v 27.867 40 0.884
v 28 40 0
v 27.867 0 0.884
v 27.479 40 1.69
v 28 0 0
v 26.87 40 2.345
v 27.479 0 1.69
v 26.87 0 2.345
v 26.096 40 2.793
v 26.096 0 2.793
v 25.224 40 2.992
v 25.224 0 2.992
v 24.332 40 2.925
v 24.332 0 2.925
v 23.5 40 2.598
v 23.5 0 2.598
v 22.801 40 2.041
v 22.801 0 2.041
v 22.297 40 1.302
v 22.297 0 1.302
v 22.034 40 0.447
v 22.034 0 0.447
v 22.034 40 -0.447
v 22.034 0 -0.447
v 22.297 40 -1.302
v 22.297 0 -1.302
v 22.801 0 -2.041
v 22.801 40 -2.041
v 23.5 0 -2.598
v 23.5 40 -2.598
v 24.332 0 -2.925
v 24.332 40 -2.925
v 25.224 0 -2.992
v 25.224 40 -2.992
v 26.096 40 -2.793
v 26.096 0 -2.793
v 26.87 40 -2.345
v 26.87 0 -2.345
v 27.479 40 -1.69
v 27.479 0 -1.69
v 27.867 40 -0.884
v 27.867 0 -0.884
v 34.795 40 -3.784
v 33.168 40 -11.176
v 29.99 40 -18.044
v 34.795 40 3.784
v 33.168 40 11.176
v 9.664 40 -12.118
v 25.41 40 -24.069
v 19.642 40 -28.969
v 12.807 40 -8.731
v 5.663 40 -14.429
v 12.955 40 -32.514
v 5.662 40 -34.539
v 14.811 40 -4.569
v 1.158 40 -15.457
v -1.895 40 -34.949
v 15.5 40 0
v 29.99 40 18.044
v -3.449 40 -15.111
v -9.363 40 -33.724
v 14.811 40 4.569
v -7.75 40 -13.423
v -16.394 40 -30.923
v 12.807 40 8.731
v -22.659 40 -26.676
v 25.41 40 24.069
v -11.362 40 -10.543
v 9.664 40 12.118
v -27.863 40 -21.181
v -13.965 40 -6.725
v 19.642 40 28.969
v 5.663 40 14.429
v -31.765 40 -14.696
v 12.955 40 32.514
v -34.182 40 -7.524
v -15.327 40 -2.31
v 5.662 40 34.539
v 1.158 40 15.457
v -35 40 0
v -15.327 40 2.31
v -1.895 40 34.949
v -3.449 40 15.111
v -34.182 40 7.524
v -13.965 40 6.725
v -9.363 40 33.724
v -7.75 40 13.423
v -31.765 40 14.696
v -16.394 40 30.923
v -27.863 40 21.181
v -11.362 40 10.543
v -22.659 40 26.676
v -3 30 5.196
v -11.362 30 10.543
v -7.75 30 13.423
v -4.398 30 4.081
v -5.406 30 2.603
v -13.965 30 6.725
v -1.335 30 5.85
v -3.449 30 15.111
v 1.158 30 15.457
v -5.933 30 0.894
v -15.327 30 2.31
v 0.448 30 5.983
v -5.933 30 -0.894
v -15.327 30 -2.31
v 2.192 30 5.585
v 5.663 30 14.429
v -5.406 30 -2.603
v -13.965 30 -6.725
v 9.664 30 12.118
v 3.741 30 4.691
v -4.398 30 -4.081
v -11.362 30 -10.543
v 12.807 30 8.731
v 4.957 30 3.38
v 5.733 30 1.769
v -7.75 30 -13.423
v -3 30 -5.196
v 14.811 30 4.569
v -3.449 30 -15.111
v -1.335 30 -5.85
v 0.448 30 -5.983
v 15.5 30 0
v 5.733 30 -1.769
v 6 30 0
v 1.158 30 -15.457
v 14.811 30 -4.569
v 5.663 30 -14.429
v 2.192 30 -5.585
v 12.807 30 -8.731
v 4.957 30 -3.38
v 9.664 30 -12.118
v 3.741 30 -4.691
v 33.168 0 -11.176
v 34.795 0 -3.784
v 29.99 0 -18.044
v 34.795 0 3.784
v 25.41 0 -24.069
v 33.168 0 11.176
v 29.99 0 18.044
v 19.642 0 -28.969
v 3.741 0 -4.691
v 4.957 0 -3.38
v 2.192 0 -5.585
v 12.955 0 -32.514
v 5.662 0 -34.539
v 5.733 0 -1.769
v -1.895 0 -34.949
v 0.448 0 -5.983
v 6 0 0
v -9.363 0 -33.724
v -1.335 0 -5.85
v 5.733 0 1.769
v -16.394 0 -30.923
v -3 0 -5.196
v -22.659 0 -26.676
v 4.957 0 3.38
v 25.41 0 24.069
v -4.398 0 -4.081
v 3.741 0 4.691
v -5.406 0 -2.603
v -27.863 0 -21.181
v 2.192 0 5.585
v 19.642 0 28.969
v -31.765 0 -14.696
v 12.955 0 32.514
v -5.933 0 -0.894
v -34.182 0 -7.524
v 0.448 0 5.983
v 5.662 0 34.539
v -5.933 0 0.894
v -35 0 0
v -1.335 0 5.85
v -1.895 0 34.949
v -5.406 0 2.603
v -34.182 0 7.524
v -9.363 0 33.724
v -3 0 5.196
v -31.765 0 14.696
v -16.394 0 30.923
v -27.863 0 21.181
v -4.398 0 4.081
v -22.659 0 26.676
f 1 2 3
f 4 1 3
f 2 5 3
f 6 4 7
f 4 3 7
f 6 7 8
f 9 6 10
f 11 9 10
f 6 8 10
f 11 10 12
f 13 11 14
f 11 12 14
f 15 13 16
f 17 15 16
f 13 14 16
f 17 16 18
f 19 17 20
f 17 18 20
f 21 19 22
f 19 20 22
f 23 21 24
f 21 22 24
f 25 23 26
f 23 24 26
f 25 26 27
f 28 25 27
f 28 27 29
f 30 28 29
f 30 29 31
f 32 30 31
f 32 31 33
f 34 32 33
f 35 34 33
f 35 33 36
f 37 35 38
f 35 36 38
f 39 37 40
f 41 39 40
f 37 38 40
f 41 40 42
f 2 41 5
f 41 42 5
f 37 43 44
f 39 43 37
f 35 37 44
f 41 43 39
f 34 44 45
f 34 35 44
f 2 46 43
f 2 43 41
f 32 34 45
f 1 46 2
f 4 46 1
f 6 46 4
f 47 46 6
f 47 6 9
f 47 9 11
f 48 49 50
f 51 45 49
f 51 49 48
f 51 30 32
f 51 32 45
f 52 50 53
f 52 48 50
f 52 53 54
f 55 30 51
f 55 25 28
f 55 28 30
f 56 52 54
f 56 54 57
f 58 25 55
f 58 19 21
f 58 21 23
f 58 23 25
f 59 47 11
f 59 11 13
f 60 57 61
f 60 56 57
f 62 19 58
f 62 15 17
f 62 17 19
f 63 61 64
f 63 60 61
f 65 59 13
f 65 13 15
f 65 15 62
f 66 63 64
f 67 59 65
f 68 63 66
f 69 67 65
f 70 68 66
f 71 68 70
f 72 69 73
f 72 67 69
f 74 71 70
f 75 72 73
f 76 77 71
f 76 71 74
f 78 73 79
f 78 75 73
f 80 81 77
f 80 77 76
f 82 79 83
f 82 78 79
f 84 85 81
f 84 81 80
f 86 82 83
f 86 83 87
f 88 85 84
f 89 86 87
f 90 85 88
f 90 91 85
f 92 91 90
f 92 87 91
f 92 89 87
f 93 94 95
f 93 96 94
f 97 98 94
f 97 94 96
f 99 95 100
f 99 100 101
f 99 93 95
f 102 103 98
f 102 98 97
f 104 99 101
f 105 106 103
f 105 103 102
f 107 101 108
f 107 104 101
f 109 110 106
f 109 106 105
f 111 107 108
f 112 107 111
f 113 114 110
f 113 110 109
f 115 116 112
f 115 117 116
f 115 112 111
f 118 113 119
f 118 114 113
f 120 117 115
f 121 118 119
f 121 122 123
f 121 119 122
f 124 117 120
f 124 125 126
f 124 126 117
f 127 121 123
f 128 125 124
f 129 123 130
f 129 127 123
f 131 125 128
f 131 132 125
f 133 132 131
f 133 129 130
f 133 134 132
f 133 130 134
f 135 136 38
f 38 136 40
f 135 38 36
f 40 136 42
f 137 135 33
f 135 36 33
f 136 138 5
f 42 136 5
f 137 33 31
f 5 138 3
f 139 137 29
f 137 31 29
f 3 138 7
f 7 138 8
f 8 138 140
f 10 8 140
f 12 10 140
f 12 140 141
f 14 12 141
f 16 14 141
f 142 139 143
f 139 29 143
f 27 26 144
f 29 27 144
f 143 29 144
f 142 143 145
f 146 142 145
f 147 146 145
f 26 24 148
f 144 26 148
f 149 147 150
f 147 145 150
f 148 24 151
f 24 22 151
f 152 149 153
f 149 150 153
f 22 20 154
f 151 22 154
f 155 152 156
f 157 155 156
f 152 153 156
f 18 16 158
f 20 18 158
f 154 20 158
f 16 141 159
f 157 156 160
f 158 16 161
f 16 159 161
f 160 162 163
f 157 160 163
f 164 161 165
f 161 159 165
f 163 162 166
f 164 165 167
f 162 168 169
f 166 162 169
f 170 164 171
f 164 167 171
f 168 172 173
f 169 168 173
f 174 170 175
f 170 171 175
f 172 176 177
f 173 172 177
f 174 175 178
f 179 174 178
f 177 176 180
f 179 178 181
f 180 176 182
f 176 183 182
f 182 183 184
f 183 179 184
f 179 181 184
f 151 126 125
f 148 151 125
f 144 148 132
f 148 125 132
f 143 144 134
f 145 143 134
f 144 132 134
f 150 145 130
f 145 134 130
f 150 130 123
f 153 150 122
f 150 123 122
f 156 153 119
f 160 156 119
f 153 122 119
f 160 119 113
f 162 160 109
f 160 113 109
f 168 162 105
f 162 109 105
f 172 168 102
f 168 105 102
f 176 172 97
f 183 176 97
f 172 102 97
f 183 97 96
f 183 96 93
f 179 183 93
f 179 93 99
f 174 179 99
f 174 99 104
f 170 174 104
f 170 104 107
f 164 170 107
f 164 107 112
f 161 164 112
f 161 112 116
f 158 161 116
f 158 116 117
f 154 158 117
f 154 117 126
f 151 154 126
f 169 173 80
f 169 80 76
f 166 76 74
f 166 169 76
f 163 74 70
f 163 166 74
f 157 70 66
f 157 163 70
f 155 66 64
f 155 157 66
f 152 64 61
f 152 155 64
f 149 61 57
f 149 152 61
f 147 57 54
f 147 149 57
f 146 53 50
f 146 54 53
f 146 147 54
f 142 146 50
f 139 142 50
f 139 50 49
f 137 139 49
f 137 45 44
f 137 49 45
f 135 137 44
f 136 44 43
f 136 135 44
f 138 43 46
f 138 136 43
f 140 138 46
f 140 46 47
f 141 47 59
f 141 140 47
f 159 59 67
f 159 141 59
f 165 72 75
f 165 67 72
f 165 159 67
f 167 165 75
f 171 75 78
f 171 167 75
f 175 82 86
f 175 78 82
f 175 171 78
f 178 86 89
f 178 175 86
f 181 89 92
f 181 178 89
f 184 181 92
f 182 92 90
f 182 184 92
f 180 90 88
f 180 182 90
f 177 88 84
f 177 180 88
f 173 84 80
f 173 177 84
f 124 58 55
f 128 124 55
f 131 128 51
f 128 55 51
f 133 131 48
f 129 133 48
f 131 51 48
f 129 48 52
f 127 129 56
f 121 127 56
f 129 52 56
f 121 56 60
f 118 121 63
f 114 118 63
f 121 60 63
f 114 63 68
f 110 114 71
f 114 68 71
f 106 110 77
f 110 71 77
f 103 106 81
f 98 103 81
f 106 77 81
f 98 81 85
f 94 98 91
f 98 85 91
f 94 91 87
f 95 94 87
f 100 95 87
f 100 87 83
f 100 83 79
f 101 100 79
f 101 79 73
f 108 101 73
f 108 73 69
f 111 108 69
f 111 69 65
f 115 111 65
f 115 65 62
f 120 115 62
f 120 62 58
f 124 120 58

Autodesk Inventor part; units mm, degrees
ref_plane "YZ Plane" through (0, 0, 0) normal (1, 0, 0) x (0, 1, 0)
ref_plane "XZ Plane" through (0, 0, 0) normal (0, 1, 0) x (-1, 0, 0)
ref_plane "XY Plane" through (0, 0, 0) normal (0, 0, 1) x (1, 0, 0)
sketch "Sketch1" plane through (0, 0, 0) normal (0, 1, 0) x (-1, 0, 0)
  circle A0 centre (0, 0) radius 35
extrude "Extrusion1" add sketch "Sketch1" along normal blind 40
sketch "Sketch2" plane through (0, 40, 0) normal (0, 1, 0) x (1, 0, 0)
  circle A0 centre (0, 0) radius 15.5
  dimension "d4" = 31
extrude "Extrusion2" cut sketch "Sketch2" against normal blind 10
sketch "Sketch3" plane through (0, 30, 0) normal (0, 1, 0) x (1, 0, 0)
  circle A0 centre (0, 0) radius 6
  dimension "d7" = 12
extrude "Extrusion3" cut sketch "Sketch3" against normal through all
sketch "Sketch4" plane through (0, 0, 0) normal (0, -1, 0) x (1, 0, 0)
  circle A0 centre (25, 0) radius 3
  point P0 (0, 0)
  dimension "d14" = 6
extrude "Extrusion4" cut sketch "Sketch4" against normal through all
properties part number "Engine"
